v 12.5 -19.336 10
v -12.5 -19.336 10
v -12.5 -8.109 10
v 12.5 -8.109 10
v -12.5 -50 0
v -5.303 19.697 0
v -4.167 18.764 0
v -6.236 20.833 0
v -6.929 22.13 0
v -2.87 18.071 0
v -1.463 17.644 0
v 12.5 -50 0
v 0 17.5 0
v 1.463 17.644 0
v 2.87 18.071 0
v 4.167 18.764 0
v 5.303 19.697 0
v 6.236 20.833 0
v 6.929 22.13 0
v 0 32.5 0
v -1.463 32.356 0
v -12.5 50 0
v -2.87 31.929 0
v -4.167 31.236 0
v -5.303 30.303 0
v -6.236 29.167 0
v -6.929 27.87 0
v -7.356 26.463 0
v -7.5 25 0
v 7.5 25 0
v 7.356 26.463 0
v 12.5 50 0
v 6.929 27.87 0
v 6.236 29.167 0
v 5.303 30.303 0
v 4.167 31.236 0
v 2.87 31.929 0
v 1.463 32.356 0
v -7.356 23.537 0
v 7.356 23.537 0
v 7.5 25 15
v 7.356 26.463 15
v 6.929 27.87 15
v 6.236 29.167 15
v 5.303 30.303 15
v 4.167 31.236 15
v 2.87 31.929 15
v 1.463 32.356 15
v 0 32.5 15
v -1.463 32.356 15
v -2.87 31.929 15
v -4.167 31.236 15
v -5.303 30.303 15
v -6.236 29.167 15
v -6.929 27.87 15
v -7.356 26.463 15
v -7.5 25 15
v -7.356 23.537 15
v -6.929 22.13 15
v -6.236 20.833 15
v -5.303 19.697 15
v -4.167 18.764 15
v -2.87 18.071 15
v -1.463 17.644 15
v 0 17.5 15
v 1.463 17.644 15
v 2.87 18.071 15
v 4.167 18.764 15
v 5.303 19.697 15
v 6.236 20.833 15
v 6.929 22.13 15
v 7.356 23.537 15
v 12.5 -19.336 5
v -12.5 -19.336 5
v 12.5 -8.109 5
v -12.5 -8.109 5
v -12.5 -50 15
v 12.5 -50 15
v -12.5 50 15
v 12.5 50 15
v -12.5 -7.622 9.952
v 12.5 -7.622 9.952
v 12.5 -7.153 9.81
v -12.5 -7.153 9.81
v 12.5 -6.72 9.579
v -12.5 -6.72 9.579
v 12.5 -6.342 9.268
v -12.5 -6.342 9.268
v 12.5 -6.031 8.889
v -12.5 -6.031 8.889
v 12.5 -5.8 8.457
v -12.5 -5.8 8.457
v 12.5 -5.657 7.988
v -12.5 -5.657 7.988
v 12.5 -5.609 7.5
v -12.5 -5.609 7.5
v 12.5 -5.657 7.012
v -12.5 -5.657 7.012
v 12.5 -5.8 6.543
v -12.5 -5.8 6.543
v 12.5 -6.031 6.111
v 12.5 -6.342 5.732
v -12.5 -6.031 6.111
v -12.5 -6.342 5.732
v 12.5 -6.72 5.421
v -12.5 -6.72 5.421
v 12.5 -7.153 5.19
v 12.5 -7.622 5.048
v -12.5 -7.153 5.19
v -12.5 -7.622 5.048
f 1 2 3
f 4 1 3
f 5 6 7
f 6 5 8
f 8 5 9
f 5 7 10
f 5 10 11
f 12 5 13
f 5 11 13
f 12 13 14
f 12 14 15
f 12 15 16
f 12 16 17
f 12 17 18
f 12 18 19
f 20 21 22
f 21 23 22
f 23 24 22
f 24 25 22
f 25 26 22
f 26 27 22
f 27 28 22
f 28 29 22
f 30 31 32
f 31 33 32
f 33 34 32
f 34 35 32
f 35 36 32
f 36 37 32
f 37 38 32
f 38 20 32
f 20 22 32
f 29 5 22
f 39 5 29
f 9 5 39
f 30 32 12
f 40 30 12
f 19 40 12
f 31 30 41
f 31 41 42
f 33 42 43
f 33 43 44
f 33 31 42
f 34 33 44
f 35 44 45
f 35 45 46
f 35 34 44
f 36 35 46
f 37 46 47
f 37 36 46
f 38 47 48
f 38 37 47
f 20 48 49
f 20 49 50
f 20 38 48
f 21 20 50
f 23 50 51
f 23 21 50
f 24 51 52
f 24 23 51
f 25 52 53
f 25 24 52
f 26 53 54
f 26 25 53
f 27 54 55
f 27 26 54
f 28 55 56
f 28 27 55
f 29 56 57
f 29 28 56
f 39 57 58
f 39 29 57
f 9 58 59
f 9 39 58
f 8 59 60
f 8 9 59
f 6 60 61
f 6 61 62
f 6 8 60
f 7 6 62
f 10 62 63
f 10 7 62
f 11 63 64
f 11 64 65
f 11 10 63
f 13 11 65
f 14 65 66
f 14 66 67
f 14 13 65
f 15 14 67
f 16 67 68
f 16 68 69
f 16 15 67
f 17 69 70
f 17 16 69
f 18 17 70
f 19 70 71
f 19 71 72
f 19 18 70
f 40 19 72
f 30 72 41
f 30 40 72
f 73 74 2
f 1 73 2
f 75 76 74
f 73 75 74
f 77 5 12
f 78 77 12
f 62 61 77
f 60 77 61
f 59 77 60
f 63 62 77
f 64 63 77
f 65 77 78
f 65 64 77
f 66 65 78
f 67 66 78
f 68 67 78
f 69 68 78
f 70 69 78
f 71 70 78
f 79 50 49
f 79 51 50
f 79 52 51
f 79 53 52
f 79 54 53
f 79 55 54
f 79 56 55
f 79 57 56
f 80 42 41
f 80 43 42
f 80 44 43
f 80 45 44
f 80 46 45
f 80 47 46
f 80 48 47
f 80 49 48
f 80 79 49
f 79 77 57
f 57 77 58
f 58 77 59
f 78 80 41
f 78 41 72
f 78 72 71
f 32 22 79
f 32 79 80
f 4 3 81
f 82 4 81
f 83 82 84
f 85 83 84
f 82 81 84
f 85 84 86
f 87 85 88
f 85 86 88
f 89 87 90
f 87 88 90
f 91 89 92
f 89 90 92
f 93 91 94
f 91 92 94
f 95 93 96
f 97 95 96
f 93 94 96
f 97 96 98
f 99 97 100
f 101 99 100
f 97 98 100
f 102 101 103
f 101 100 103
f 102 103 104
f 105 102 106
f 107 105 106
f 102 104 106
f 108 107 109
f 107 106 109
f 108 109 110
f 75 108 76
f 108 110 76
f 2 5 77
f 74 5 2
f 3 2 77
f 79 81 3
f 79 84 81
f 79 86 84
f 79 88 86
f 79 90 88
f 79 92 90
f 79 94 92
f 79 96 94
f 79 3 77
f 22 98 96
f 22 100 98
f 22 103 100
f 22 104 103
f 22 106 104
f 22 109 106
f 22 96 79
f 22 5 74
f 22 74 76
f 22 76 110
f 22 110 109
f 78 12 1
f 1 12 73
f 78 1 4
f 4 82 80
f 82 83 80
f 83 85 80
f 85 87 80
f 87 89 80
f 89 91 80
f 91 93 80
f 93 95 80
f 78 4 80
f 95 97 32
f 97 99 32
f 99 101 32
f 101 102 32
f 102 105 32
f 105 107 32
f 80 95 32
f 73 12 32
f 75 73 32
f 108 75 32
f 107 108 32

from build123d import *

# Parameters (mm, degrees)
F2_W     = 25
F2_H     = 100
F2_R     = 7.5
F0_DEPTH = 15
F1_DEPTH = 25


with BuildPart() as f0:
    # F2 (on Top) → F0 (new body)
    with BuildSketch(Plane.XY):
        Rectangle(F2_W, F2_H)
        with Locations((0, 25)):
            Circle(F2_R, mode=Mode.SUBTRACT)
    extrude(amount=F0_DEPTH)

    # F3 (on face) → F1 (cut, through all)
    with BuildSketch(Plane(origin=(-12.5, 0, 0), x_dir=(0, -1, 0), z_dir=(-1, 0, 0))):
        with BuildLine():
            Line((8.109305, 5), (19.336069, 5))
            Line((19.336069, 5), (19.336069, 10))
            Line((19.336069, 10), (8.109305, 10))
            ThreePointArc((8.109305, 10), (5.609305, 7.5), (8.109305, 5))
        make_face()
    extrude(amount=-F1_DEPTH, mode=Mode.SUBTRACT)


solid = f0.part
